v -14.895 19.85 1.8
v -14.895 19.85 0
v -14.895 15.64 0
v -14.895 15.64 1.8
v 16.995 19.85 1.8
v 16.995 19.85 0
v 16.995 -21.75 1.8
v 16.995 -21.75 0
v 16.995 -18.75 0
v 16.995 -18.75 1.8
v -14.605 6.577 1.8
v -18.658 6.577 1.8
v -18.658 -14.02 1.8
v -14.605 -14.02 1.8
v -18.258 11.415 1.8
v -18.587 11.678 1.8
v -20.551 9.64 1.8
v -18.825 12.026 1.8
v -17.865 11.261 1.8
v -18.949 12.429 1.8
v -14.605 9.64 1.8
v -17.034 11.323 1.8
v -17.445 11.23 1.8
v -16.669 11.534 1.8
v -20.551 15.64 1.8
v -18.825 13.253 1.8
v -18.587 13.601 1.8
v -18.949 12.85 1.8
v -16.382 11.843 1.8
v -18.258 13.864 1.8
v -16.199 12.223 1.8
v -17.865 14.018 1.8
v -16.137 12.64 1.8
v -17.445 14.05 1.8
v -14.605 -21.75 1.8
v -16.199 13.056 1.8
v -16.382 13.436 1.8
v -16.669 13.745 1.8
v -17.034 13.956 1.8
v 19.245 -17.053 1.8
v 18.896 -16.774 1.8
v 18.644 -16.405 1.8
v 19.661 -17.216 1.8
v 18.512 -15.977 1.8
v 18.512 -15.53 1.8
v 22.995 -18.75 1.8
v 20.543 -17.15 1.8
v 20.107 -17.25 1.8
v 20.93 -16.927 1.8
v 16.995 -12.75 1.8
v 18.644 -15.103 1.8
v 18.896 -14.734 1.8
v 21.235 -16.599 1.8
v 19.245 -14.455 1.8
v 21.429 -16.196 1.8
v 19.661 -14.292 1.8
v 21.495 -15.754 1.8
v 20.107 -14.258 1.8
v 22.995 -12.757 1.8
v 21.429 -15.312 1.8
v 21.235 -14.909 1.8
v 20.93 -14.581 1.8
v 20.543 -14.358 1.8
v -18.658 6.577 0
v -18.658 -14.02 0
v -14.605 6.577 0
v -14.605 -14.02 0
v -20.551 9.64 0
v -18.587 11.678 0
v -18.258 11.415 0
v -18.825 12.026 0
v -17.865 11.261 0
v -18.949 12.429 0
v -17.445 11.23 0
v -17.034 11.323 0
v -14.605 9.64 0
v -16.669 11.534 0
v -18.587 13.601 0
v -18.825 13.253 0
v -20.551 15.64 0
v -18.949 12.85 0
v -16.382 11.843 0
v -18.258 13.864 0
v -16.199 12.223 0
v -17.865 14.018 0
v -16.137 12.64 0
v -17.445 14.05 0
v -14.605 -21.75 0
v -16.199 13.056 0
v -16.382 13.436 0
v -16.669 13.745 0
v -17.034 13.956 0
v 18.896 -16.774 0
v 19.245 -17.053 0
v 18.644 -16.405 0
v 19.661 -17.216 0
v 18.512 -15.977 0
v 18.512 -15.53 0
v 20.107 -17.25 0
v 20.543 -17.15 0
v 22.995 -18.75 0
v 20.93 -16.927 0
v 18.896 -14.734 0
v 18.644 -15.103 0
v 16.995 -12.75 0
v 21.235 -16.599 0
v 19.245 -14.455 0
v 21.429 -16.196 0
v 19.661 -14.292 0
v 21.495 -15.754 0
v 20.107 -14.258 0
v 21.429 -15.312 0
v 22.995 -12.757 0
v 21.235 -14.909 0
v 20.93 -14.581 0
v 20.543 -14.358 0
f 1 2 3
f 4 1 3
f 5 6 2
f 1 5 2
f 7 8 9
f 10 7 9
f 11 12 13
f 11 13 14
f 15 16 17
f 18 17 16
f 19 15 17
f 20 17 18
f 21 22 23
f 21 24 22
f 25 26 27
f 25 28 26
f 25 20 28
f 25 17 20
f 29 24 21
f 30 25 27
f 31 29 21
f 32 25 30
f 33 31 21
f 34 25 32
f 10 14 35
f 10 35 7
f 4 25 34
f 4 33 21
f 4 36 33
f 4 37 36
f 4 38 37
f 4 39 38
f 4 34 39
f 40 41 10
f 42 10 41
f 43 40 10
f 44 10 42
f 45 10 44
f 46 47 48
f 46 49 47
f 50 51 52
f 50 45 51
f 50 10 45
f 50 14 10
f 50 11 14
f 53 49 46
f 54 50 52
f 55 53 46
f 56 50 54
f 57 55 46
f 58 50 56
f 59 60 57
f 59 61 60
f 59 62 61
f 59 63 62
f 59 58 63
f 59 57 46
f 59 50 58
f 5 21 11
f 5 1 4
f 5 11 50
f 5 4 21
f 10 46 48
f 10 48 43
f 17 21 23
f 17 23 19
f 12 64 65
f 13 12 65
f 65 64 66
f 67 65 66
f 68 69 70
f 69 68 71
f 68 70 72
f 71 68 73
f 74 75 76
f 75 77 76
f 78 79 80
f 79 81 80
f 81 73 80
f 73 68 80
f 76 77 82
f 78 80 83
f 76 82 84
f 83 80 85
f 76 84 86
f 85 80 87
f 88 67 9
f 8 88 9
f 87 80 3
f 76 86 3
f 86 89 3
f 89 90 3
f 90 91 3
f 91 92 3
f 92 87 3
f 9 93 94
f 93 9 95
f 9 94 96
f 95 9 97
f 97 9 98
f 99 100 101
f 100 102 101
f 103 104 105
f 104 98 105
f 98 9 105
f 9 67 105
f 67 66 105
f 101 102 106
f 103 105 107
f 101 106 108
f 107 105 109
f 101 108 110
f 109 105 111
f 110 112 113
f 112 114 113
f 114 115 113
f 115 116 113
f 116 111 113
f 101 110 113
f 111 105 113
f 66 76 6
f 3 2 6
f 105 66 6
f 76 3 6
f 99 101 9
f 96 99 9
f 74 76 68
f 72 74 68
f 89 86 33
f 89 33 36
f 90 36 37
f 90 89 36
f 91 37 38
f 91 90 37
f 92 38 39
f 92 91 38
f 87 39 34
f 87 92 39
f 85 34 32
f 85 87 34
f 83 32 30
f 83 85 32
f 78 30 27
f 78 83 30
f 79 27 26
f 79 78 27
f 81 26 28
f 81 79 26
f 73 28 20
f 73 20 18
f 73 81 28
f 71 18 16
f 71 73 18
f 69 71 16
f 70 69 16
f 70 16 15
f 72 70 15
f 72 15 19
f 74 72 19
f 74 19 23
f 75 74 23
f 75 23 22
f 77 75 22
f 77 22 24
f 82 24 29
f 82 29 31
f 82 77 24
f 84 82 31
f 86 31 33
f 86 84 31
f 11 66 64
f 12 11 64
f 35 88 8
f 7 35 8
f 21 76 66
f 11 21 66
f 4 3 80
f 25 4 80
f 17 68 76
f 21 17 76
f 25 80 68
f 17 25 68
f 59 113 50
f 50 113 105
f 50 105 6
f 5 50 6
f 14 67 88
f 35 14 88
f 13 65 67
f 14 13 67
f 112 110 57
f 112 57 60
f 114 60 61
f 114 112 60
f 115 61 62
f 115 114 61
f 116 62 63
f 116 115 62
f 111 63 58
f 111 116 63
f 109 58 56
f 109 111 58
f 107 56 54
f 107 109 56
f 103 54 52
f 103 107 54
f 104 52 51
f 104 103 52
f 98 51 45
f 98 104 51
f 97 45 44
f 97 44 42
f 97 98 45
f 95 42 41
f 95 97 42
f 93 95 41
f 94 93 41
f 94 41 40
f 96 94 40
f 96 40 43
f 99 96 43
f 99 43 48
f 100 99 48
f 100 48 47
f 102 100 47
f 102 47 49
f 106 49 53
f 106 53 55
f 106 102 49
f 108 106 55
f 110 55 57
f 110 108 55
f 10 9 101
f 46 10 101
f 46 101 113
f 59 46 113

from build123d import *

# Parameters (mm, degrees)
SKETCH1_R           = 1.414036492
SKETCH1_R_2         = 1.5
BOSS_EXTRUDE1_DEPTH = 1.8


with BuildPart() as part:
    # Sketch1 → Boss-Extrude1 (new body)
    with BuildSketch(Plane.XY):
        Polygon((-14.604832392, 9.639595654), (-14.604832392, 6.577460034), (-18.658403667, 6.577460034), (-18.658403667, -14.020338192), (-14.604832392, -14.020338192), (-14.604832392, -21.750404346), (16.995167608, -21.750404346), (16.995167608, -18.750404346), (22.995167608, -18.750404346), (22.995167608, -12.757063543), (16.995167608, -12.750404346), (16.995167608, 19.849595654), (-14.894517711, 19.849595654), (-14.894517711, 15.639595654), (-20.550663677, 15.639595654), (-20.550663677, 9.639595654), align=None)
        with Locations((-17.550663677, 12.639595654)):
            Circle(SKETCH1_R, mode=Mode.SUBTRACT)
        with Locations((19.995167608, -15.753900813)):
            Circle(SKETCH1_R_2, mode=Mode.SUBTRACT)
    extrude(amount=BOSS_EXTRUDE1_DEPTH)


solid = part.part
